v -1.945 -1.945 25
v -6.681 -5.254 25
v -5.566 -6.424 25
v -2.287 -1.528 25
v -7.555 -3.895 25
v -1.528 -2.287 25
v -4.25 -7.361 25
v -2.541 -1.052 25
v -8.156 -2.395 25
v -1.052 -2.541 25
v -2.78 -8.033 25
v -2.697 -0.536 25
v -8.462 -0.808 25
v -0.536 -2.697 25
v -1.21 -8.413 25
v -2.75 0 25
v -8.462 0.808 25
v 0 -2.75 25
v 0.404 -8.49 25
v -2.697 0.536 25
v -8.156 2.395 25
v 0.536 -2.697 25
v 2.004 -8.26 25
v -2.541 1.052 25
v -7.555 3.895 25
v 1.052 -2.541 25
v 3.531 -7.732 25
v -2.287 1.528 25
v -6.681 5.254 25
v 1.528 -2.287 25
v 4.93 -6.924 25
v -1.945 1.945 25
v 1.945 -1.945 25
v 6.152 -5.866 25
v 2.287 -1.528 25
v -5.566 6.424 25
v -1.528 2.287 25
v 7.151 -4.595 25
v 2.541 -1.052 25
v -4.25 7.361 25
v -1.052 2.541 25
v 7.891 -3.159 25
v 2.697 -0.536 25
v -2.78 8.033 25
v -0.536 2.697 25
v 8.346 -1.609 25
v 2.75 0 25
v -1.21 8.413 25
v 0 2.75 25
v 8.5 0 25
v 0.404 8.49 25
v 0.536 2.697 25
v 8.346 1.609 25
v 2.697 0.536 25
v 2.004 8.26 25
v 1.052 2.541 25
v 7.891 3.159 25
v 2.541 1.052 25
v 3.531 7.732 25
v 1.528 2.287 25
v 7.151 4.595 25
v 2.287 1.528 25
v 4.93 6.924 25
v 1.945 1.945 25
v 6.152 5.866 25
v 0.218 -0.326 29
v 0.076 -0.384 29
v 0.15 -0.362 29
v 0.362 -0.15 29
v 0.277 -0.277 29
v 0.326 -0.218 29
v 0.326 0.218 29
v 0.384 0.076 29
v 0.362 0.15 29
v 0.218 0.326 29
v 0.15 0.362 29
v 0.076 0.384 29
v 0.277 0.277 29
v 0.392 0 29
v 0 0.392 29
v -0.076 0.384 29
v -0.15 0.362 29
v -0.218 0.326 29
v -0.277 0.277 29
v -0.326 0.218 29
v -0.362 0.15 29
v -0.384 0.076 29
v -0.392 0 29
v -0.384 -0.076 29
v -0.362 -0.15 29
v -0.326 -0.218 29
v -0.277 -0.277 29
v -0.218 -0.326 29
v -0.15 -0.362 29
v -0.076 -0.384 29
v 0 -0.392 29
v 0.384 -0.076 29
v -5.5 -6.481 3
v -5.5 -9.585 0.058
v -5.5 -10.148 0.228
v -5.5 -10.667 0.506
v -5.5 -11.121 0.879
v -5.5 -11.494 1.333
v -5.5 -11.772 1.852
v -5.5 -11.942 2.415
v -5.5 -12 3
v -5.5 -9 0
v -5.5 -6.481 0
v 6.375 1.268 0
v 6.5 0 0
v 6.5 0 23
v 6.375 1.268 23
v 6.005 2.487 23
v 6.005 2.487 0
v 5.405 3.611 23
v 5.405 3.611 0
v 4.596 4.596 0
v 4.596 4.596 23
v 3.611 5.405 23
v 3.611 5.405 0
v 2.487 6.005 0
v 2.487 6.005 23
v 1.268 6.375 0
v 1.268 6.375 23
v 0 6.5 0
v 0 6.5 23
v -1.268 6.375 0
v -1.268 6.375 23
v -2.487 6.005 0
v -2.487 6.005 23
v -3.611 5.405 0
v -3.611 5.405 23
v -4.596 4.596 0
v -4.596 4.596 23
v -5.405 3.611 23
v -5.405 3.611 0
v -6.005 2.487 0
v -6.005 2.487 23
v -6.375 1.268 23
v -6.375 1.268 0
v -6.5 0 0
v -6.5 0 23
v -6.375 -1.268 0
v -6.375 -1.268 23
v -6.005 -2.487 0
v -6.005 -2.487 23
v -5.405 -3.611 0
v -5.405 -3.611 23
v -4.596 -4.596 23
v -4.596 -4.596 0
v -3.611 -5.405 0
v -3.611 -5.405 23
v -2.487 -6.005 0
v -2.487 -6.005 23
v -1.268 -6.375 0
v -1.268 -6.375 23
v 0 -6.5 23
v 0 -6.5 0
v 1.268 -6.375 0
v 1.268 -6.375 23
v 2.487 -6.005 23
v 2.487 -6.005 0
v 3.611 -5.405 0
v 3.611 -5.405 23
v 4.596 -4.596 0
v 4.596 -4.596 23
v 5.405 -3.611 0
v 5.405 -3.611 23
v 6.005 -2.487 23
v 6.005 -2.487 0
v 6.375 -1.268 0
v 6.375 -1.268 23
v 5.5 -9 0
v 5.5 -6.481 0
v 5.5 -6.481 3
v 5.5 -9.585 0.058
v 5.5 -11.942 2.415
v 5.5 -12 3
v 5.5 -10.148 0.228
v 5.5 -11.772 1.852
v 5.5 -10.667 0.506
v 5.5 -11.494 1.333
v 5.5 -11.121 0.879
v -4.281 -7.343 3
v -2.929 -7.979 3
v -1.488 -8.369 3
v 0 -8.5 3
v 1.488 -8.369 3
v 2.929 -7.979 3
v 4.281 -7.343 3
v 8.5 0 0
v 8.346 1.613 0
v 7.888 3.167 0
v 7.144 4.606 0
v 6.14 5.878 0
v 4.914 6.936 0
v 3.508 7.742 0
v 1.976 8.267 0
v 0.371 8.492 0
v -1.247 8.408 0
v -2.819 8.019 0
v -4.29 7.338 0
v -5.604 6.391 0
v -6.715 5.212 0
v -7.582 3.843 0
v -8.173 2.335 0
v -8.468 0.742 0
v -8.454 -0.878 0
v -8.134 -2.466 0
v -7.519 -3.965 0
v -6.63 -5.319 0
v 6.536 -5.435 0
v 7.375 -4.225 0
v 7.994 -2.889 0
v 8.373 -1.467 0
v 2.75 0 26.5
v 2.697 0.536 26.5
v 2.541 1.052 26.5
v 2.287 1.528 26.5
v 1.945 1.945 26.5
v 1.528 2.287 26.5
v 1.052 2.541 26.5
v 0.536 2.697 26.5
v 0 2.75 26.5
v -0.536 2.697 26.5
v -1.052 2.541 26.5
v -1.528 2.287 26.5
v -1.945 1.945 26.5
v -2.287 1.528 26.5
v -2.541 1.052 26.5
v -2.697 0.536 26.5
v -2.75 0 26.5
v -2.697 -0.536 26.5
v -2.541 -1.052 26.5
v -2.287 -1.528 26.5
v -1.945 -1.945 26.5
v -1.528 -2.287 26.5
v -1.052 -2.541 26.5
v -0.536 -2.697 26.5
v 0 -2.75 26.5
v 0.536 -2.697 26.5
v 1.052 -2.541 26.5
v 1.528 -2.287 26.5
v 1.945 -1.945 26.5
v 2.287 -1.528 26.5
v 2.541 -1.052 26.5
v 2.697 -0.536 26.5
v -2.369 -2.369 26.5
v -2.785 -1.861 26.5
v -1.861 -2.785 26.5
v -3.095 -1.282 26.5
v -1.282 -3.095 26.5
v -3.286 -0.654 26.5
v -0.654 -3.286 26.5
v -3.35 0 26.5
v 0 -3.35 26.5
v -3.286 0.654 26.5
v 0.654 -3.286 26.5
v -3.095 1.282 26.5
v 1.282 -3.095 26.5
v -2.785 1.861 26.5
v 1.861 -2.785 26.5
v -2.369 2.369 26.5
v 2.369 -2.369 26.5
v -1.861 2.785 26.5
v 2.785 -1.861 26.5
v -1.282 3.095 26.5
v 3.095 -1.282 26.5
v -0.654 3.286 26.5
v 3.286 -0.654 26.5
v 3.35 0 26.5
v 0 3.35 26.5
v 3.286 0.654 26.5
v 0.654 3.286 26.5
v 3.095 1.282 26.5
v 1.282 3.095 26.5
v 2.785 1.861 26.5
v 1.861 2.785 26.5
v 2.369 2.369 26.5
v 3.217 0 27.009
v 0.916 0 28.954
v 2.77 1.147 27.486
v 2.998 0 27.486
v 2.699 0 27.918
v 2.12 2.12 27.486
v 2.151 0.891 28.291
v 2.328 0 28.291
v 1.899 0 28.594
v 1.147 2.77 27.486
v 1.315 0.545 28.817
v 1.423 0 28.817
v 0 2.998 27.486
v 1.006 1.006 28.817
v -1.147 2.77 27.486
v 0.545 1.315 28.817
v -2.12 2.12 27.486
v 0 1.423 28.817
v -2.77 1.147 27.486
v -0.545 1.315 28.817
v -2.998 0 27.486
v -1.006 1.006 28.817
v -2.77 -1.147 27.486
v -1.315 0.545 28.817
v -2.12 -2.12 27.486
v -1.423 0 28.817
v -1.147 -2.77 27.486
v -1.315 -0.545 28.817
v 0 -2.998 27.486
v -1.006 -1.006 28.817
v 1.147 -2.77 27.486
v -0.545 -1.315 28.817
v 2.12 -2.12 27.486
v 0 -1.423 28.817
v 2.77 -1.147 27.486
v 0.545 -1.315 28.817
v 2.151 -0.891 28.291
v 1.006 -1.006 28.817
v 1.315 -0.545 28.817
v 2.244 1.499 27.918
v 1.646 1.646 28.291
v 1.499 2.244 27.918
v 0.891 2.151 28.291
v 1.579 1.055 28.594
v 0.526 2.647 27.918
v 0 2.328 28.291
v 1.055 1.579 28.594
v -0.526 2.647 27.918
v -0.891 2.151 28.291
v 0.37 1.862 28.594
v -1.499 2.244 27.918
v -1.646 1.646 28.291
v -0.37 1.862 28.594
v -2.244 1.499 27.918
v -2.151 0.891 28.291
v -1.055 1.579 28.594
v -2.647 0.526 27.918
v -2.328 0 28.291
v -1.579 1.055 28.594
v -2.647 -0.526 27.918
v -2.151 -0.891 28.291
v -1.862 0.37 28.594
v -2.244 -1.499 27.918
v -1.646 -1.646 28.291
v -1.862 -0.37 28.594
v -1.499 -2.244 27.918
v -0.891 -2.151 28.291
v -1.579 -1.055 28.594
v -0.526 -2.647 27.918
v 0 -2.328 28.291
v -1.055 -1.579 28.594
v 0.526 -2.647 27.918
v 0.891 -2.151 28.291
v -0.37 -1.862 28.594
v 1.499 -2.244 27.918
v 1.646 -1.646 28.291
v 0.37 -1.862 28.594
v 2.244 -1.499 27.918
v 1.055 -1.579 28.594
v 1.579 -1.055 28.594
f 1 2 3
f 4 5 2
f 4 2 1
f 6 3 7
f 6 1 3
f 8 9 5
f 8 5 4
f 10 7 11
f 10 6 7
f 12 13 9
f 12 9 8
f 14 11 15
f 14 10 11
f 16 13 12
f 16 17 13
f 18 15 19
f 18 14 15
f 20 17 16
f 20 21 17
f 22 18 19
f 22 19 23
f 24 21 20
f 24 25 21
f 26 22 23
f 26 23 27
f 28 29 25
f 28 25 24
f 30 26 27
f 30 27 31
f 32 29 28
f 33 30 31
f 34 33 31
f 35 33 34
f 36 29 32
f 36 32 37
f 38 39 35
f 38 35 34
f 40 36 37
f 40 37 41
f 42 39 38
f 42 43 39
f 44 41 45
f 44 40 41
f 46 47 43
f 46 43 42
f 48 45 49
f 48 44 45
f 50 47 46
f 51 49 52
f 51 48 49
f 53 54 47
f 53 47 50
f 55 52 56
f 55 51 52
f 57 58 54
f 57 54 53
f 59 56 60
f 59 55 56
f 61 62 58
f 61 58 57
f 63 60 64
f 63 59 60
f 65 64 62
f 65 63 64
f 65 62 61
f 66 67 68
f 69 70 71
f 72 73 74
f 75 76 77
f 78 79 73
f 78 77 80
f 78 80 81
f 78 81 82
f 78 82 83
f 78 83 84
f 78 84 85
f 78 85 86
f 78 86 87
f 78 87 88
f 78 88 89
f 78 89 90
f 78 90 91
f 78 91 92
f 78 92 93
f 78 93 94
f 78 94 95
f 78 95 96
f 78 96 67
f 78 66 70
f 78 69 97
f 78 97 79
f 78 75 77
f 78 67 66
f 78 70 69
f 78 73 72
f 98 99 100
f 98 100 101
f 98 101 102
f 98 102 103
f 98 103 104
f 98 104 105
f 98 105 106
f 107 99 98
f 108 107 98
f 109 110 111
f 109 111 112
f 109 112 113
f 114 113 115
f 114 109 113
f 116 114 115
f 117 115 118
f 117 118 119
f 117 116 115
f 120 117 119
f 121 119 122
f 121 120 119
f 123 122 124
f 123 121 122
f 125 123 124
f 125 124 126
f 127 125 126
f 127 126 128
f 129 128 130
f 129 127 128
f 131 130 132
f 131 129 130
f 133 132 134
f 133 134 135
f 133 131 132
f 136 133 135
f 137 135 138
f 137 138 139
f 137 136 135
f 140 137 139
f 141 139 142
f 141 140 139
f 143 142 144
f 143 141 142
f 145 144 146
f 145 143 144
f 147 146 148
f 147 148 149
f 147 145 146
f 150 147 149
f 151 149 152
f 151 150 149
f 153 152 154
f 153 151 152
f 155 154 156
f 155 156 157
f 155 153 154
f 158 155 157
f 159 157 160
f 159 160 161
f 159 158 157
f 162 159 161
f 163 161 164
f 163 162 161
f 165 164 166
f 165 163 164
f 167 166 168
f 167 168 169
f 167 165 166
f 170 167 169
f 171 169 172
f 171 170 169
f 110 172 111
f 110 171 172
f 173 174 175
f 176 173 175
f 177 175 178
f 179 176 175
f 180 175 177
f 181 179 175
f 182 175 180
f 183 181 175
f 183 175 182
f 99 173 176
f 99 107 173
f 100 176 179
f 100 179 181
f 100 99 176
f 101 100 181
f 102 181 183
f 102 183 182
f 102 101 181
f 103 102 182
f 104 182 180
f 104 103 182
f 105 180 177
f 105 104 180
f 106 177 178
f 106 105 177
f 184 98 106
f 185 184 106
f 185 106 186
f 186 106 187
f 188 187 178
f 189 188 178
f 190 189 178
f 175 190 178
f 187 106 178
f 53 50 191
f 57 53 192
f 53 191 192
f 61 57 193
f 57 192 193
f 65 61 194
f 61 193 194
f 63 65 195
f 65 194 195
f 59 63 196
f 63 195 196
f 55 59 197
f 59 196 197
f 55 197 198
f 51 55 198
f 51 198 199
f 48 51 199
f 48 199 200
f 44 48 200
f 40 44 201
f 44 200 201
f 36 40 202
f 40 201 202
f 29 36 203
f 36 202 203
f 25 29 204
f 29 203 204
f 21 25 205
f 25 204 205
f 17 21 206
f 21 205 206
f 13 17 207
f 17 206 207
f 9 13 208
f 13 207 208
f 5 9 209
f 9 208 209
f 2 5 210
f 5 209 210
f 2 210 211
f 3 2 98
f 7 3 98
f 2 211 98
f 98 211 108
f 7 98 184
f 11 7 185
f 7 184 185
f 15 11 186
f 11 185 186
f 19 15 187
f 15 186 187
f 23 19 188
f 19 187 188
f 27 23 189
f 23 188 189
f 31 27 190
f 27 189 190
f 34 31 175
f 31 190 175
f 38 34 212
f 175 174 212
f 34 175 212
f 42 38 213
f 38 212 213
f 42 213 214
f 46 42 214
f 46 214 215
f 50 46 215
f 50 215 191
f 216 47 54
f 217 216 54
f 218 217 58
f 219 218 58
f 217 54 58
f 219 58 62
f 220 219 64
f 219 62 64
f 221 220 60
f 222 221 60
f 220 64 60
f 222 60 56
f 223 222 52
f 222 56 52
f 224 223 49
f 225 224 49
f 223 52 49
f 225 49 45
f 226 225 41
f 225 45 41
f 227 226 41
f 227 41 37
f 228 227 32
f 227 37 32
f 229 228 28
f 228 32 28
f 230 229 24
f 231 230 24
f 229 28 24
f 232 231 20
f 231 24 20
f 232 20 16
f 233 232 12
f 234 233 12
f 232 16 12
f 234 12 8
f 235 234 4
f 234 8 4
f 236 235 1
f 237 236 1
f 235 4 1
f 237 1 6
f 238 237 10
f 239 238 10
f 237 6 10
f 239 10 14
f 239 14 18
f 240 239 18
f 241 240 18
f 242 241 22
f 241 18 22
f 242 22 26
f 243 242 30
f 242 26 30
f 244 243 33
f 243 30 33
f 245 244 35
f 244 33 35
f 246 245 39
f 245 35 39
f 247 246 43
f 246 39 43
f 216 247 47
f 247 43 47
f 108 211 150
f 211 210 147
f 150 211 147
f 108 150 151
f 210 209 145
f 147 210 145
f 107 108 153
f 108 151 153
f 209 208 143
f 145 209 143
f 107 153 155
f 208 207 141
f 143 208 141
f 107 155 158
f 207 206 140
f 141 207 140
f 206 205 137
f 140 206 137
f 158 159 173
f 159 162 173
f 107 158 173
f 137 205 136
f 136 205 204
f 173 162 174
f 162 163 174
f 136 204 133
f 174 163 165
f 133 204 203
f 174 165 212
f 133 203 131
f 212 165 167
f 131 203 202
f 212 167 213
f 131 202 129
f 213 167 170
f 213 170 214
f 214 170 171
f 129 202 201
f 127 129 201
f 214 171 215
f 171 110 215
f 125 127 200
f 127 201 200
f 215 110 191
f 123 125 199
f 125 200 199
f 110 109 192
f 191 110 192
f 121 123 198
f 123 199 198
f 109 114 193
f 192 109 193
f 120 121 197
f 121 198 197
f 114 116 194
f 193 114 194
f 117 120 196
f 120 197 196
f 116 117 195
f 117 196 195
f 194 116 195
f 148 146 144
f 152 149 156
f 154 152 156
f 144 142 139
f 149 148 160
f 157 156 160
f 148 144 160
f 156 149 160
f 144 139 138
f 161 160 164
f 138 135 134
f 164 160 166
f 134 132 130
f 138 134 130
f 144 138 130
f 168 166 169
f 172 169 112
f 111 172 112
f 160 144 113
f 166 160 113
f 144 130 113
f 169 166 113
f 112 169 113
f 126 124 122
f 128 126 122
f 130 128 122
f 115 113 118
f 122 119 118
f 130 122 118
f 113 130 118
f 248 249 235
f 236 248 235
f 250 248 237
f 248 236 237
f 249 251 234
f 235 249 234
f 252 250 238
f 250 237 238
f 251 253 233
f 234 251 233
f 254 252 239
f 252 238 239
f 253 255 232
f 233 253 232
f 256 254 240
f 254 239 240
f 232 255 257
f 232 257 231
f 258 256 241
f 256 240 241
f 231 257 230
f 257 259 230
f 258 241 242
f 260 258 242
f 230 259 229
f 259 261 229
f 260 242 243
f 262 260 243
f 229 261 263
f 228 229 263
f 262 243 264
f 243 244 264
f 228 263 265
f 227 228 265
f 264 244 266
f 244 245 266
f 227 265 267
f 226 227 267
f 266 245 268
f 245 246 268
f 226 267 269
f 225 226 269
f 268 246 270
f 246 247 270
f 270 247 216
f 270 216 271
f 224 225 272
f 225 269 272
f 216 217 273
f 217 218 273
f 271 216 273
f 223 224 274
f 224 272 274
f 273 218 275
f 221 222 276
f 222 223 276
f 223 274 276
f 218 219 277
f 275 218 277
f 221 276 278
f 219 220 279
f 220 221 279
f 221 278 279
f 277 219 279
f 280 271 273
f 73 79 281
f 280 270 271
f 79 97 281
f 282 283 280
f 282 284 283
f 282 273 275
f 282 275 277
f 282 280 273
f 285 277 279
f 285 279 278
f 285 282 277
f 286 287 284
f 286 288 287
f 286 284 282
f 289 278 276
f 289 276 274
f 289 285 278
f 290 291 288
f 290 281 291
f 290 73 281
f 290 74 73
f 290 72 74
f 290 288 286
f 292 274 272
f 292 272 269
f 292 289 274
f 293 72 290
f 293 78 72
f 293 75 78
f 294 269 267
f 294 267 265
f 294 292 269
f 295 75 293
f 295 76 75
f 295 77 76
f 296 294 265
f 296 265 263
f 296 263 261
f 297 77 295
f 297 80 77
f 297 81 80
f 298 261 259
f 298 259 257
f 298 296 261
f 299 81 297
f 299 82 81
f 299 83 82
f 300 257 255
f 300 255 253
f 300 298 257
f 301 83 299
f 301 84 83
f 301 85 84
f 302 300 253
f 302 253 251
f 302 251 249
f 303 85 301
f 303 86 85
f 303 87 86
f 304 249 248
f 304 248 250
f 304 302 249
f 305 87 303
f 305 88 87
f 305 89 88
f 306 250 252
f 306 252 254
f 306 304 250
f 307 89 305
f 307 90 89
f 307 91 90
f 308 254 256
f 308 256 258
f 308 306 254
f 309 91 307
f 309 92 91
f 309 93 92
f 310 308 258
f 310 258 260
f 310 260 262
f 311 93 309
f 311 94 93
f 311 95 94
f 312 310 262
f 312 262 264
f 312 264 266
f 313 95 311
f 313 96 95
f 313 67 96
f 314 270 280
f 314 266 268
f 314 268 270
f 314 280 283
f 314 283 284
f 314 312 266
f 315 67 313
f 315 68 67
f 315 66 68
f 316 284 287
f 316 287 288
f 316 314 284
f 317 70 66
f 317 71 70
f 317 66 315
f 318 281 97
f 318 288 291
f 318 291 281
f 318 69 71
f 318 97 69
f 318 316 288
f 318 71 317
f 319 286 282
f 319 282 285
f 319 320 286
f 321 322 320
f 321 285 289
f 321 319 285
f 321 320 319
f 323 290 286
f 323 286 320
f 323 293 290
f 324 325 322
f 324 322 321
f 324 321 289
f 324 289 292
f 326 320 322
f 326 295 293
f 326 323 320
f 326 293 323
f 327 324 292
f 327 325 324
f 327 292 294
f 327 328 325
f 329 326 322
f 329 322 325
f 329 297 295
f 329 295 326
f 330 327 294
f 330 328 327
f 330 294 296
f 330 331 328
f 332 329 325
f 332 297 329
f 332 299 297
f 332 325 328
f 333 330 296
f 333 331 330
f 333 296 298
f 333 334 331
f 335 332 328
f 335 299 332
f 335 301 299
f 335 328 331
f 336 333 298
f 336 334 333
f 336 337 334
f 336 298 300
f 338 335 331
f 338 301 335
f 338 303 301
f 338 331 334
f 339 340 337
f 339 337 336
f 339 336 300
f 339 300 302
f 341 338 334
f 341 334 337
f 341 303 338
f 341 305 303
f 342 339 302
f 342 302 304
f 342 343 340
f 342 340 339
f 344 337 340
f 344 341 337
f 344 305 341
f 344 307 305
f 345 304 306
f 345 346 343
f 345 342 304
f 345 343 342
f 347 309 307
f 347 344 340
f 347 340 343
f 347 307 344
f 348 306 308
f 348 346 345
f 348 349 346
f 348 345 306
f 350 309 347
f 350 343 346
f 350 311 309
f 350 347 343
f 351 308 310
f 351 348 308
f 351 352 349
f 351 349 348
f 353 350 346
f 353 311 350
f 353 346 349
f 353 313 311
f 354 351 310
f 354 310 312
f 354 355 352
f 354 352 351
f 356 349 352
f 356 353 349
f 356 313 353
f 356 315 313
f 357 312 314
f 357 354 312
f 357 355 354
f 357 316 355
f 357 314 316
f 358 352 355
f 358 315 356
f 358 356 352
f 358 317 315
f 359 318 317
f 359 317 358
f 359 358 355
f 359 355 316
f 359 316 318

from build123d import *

# Parameters (mm, degrees)
F0_R      = 8.5
F0_R_2    = 6.5
F1_DEPTH  = 23
F2_R      = 8.5
F3_DEPTH  = 2
F5_DEPTH  = 3
F6_R      = 2.99999
F7_R      = 2.75
F8_DEPTH  = 1.5
F9_R      = 3.35
F10_DEPTH = 2.5


# Not quite as in the source:
# - a fillet or chamfer that OpenCascade refuses, or shapes differently, is made with other operations: its cross-section is extruded or revolved along the edge and cut away or added
# - a fillet or chamfer is up to 0.001 mm smaller than in the source, because OpenCascade refuses the exact size


with BuildPart() as f1:
    # F0 (on Top) → F1 (new body)
    with BuildSketch(Plane.XY):
        Circle(F0_R)
        Circle(F0_R_2, mode=Mode.SUBTRACT)
    extrude(amount=F1_DEPTH)

    # F2 (on face) → F3 (join)
    with BuildSketch(Plane.XY.offset(23)):
        Circle(F2_R)
    extrude(amount=F3_DEPTH)

    # F4 (on face) → F5 (join)
    with BuildSketch(Plane(origin=(0, 0, 0), x_dir=(1, 0, 0), z_dir=(0, 0, -1))):
        with BuildLine():
            ThreePointArc((-5.5, 6.4807406984), (-2.9294798227, 7.9792322919), (0, 8.5))
            Line((0, 8.5), (0, 12))
            Line((0, 12), (-5.5, 12))
            Line((-5.5, 12), (-5.5, 6.4807406984))
        make_face()
        with BuildLine():
            Line((0, 12), (0, 8.5))
            ThreePointArc((0, 8.5), (2.9294798227, 7.9792322919), (5.5, 6.4807406984))
            Line((5.5, 6.4807406984), (5.5, 12))
            Line((5.5, 12), (0, 12))
        make_face()
    extrude(amount=-F5_DEPTH)

    # F6 (radius 3 in the source; OpenCascade refuses exactly that, so slightly less here)
    f6_edges = [f1.edges().sort_by_distance(p)[0] for p in [
        (0, -12, 0),
    ]]
    fillet(f6_edges, radius=F6_R)

    # F7 (on face) → F8 (join)
    with BuildSketch(Plane.XY.offset(25)):
        Circle(F7_R)
    extrude(amount=F8_DEPTH)

    # F9 (on face) → F10 (join)
    with BuildSketch(Plane.XY.offset(26.5)):
        Circle(F9_R)
    extrude(amount=F10_DEPTH)

    # F11: fillet of radius 3 on 1 edges, made by hand

    # F11_s1 → F11_t2 (revolve, cut)
    with BuildSketch(Plane.XZ):
        with BuildLine():
            ThreePointArc((3.35, 26.5), (2.3284517816, 28.2912878475), (0.3919601084, 29))
            Line((0.3919601084, 29), (3.35, 29))
            Line((3.35, 29), (3.35, 26.5))
        make_face()
    revolve(axis=Axis((0, 0, 29), (0, 0, 1)), mode=Mode.SUBTRACT)


solid = f1.part
